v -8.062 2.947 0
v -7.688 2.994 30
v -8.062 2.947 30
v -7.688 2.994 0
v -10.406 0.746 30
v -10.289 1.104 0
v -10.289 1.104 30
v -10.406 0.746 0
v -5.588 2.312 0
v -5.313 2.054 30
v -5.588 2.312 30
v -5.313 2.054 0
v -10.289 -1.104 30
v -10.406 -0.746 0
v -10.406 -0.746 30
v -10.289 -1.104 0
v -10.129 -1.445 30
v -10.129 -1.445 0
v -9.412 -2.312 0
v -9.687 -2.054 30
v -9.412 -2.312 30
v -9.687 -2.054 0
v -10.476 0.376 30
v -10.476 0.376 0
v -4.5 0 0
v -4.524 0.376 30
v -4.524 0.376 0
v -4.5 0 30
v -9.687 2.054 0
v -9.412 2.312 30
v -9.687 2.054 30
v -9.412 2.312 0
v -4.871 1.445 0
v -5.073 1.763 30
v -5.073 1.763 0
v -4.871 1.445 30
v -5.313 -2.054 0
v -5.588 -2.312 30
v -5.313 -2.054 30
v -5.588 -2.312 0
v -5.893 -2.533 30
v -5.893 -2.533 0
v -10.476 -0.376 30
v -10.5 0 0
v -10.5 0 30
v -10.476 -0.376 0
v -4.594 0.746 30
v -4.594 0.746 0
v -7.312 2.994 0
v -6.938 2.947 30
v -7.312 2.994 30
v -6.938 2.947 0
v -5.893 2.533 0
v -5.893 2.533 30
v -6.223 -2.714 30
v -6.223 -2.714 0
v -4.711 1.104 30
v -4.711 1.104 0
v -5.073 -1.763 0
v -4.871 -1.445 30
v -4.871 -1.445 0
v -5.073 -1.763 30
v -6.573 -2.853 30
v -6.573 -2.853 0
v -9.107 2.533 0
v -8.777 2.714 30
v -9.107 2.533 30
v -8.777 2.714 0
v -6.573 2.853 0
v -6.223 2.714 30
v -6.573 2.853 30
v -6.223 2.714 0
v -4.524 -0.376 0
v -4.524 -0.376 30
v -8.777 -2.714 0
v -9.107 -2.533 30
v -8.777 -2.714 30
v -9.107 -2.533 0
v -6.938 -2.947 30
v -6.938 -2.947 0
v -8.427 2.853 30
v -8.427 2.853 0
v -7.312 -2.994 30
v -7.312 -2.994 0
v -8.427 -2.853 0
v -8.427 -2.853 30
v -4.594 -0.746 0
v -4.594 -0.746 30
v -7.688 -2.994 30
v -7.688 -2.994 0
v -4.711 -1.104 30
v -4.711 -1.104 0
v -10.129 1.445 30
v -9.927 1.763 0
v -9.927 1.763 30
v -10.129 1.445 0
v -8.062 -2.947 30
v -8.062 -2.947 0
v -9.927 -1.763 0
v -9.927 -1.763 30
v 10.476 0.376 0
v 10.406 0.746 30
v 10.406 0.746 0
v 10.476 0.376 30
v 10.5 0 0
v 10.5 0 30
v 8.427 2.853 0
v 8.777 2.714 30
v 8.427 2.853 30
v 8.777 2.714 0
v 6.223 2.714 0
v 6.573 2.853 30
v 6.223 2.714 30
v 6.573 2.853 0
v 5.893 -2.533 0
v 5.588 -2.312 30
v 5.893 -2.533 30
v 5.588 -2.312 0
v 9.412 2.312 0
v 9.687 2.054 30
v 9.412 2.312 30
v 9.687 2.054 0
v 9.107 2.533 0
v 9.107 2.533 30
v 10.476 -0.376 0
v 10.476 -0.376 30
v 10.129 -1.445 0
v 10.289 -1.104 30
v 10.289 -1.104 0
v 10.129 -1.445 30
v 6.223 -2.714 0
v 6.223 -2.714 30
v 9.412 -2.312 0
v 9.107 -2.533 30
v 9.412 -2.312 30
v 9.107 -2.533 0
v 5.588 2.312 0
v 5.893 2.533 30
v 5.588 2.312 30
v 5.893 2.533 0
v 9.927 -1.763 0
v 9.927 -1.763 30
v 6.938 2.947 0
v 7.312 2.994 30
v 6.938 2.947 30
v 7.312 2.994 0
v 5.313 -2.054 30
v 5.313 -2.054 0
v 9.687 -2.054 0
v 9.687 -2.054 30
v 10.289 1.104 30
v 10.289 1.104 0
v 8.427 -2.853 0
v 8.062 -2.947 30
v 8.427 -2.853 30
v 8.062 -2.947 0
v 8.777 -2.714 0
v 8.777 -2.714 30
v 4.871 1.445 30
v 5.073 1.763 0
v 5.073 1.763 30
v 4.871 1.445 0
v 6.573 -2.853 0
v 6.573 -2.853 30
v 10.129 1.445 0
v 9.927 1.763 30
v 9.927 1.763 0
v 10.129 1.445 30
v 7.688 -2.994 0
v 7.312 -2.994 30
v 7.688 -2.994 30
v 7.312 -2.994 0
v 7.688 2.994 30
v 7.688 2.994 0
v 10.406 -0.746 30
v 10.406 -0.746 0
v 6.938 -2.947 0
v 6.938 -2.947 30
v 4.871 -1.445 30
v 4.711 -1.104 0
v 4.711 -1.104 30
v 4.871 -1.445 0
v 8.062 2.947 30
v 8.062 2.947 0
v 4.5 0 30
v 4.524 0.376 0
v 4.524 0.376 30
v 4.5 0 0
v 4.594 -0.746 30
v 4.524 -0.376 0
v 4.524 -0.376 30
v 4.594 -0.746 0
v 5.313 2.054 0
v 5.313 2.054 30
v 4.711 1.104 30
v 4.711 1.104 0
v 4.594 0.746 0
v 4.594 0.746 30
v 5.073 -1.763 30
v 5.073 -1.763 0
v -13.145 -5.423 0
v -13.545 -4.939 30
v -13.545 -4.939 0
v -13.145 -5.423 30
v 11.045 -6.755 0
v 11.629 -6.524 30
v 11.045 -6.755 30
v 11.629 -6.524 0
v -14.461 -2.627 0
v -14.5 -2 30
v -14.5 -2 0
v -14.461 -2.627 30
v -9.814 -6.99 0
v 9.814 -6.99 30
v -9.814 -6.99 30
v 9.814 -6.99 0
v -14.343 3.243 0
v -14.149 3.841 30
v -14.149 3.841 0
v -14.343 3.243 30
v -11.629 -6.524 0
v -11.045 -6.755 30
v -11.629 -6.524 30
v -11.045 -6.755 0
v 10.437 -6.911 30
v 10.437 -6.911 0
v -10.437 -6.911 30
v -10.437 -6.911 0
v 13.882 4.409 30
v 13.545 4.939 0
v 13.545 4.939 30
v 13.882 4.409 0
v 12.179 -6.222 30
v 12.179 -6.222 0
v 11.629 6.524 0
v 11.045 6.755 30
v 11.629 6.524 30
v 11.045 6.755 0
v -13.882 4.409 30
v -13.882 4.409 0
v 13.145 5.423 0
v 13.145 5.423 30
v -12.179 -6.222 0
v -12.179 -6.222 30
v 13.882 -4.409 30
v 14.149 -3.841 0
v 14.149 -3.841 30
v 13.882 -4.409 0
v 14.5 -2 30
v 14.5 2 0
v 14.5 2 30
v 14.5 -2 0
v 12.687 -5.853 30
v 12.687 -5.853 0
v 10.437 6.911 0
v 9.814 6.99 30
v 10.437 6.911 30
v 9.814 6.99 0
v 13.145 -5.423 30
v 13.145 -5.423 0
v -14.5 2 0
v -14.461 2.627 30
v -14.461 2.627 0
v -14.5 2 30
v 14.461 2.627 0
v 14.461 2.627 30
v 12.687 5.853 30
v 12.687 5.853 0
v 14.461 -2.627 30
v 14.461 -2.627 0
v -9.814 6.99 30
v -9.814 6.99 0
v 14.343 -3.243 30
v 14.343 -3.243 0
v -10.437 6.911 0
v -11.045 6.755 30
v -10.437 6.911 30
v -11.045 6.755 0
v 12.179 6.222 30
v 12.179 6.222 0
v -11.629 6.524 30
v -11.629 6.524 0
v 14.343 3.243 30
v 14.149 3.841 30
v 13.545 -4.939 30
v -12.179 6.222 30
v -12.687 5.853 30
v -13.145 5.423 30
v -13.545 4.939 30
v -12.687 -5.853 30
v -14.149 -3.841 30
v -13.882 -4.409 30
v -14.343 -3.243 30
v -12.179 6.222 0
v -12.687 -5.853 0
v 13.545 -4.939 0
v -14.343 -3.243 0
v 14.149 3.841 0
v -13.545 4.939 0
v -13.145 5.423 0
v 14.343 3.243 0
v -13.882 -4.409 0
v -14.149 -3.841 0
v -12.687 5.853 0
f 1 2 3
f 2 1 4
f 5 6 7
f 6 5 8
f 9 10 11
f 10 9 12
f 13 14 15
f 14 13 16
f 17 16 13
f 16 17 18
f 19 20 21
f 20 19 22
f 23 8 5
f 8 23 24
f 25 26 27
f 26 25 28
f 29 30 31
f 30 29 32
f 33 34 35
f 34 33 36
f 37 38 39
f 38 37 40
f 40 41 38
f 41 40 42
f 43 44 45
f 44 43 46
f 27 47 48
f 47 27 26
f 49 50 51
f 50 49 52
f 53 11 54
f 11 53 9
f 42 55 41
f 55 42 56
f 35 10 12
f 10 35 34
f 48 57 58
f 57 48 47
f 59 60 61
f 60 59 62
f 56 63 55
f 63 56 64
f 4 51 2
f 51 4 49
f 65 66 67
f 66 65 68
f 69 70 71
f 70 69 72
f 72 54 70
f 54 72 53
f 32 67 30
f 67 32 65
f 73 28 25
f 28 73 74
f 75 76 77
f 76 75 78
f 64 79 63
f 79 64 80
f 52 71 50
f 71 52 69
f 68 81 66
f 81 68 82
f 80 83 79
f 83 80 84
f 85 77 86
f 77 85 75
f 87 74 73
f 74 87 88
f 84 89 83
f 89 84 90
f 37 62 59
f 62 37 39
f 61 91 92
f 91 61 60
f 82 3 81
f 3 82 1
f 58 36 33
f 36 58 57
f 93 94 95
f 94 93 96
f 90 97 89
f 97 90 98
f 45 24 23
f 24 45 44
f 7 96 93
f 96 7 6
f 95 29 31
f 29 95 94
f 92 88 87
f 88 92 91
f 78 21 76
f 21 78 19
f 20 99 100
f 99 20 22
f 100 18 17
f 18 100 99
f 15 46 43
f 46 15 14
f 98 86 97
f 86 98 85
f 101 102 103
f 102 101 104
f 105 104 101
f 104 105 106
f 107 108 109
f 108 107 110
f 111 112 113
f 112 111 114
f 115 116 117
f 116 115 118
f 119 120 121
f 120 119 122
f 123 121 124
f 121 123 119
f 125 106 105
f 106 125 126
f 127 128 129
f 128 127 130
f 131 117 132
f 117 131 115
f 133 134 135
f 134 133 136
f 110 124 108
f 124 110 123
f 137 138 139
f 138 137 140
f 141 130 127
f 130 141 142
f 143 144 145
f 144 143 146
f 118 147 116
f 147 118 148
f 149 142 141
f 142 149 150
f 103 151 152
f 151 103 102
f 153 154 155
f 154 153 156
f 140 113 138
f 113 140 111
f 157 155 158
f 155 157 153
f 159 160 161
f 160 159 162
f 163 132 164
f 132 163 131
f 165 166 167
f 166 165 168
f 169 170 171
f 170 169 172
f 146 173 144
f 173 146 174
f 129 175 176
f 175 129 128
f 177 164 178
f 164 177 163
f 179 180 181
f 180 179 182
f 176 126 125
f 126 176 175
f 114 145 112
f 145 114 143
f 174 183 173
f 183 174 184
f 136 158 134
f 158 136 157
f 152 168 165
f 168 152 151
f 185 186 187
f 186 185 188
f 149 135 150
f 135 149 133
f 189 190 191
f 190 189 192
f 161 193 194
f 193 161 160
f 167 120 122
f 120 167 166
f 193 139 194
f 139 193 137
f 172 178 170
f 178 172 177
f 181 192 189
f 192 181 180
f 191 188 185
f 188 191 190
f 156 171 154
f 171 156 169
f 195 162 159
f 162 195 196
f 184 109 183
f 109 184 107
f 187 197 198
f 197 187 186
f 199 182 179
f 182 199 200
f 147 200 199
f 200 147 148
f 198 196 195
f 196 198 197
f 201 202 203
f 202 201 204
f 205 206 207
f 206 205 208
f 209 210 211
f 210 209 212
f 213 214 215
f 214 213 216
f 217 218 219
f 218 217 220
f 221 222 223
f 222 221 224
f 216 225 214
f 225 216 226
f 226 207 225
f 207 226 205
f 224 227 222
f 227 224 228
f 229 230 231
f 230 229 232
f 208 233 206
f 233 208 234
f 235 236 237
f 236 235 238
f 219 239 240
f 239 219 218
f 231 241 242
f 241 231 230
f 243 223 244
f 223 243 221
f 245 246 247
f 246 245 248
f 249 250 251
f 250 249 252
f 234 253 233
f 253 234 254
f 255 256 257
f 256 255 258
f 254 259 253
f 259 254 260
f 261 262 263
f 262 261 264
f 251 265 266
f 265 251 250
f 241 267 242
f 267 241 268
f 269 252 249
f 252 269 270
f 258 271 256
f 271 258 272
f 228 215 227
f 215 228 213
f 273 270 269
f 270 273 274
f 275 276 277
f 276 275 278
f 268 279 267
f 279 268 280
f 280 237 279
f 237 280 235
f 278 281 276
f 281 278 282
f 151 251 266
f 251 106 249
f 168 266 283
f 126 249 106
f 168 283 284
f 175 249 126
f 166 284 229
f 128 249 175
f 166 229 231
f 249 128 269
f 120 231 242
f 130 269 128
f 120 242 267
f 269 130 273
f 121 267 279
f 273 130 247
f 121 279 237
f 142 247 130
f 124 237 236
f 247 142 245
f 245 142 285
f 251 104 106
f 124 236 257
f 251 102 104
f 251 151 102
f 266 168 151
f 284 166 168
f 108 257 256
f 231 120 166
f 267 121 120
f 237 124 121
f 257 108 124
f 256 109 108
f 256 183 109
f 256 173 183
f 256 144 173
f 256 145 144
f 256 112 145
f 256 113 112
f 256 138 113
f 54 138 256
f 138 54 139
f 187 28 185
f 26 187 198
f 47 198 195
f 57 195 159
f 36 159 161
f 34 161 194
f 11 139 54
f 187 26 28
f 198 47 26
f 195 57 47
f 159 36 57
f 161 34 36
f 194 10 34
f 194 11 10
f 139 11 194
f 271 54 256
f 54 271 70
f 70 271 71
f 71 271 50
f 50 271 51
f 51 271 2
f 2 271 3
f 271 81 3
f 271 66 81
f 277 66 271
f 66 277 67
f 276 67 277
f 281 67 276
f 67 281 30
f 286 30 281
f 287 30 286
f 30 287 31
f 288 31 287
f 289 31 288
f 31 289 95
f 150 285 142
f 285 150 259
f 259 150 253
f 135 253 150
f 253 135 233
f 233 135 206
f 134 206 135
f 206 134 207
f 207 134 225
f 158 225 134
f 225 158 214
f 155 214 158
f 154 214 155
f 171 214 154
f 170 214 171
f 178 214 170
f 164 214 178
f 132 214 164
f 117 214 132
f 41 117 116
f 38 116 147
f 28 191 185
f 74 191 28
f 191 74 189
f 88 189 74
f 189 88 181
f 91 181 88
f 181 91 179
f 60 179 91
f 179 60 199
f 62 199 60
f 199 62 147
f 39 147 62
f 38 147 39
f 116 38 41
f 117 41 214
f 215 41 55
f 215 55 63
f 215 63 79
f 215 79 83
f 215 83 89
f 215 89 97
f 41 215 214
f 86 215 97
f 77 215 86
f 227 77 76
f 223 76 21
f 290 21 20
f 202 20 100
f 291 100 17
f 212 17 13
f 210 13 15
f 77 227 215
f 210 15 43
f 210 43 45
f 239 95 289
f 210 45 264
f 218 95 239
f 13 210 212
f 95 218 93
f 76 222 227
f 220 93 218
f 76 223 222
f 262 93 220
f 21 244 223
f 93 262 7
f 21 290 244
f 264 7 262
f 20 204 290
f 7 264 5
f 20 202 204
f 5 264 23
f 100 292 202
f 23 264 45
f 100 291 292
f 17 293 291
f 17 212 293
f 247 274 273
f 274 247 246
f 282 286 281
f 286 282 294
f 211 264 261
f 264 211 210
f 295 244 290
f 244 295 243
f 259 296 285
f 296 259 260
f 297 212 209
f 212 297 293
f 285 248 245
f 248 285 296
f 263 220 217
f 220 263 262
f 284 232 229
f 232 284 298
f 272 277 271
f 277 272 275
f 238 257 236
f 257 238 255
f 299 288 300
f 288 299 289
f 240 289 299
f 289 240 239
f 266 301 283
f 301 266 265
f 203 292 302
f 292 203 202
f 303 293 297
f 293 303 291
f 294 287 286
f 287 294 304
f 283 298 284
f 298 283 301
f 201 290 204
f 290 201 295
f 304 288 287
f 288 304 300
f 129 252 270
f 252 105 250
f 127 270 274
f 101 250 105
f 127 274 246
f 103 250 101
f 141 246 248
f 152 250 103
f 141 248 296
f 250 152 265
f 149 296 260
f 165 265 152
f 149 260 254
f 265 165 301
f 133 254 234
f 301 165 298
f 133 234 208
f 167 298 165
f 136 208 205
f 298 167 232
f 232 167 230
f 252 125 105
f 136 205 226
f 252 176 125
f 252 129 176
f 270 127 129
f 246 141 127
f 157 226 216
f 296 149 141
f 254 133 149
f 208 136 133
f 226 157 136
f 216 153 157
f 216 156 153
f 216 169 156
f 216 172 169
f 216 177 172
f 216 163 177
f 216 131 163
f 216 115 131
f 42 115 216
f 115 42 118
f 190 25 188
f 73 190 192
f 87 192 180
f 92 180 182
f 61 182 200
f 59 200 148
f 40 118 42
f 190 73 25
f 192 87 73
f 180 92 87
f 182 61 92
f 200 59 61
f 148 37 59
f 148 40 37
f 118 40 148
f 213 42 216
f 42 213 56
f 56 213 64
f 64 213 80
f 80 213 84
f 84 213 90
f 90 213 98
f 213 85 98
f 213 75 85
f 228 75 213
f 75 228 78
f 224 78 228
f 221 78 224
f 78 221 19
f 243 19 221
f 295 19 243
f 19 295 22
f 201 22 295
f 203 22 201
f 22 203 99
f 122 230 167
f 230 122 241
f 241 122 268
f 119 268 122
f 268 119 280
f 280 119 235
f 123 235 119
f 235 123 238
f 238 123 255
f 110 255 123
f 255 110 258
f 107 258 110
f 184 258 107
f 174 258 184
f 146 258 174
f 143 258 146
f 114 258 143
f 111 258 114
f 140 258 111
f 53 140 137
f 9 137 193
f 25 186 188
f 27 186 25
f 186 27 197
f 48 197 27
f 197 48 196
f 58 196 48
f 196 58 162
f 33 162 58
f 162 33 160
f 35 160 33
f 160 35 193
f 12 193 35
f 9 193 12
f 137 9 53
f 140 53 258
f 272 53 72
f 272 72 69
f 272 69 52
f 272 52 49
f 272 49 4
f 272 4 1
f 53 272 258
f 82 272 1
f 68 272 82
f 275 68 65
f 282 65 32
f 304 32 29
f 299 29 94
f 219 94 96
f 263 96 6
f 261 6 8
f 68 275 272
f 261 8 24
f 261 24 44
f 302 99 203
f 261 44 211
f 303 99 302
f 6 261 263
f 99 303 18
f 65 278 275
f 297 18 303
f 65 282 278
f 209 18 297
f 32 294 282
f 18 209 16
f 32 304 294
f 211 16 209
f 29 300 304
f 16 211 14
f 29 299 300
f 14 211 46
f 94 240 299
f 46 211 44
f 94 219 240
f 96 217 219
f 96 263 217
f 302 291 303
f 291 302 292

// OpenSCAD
$fn = 50;


difference() {
	union() {
		hull() {
			translate(v = [-9.5000000000, 2.0000000000, 0]) {
				cylinder(h = 30, r = 5);
			}
			translate(v = [9.5000000000, 2.0000000000, 0]) {
				cylinder(h = 30, r = 5);
			}
			translate(v = [-9.5000000000, -2.0000000000, 0]) {
				cylinder(h = 30, r = 5);
			}
			translate(v = [9.5000000000, -2.0000000000, 0]) {
				cylinder(h = 30, r = 5);
			}
		}
	}
	union() {
		translate(v = [-7.5000000000, 0.0000000000, -100.0000000000]) {
			cylinder(h = 200, r = 3.0000000000);
		}
		translate(v = [-7.5000000000, 0.0000000000, -100.0000000000]) {
			cylinder(h = 200, r = 3.0000000000);
		}
		translate(v = [7.5000000000, 0.0000000000, -100.0000000000]) {
			cylinder(h = 200, r = 3.0000000000);
		}
		translate(v = [7.5000000000, 0.0000000000, -100.0000000000]) {
			cylinder(h = 200, r = 3.0000000000);
		}
	}
}
